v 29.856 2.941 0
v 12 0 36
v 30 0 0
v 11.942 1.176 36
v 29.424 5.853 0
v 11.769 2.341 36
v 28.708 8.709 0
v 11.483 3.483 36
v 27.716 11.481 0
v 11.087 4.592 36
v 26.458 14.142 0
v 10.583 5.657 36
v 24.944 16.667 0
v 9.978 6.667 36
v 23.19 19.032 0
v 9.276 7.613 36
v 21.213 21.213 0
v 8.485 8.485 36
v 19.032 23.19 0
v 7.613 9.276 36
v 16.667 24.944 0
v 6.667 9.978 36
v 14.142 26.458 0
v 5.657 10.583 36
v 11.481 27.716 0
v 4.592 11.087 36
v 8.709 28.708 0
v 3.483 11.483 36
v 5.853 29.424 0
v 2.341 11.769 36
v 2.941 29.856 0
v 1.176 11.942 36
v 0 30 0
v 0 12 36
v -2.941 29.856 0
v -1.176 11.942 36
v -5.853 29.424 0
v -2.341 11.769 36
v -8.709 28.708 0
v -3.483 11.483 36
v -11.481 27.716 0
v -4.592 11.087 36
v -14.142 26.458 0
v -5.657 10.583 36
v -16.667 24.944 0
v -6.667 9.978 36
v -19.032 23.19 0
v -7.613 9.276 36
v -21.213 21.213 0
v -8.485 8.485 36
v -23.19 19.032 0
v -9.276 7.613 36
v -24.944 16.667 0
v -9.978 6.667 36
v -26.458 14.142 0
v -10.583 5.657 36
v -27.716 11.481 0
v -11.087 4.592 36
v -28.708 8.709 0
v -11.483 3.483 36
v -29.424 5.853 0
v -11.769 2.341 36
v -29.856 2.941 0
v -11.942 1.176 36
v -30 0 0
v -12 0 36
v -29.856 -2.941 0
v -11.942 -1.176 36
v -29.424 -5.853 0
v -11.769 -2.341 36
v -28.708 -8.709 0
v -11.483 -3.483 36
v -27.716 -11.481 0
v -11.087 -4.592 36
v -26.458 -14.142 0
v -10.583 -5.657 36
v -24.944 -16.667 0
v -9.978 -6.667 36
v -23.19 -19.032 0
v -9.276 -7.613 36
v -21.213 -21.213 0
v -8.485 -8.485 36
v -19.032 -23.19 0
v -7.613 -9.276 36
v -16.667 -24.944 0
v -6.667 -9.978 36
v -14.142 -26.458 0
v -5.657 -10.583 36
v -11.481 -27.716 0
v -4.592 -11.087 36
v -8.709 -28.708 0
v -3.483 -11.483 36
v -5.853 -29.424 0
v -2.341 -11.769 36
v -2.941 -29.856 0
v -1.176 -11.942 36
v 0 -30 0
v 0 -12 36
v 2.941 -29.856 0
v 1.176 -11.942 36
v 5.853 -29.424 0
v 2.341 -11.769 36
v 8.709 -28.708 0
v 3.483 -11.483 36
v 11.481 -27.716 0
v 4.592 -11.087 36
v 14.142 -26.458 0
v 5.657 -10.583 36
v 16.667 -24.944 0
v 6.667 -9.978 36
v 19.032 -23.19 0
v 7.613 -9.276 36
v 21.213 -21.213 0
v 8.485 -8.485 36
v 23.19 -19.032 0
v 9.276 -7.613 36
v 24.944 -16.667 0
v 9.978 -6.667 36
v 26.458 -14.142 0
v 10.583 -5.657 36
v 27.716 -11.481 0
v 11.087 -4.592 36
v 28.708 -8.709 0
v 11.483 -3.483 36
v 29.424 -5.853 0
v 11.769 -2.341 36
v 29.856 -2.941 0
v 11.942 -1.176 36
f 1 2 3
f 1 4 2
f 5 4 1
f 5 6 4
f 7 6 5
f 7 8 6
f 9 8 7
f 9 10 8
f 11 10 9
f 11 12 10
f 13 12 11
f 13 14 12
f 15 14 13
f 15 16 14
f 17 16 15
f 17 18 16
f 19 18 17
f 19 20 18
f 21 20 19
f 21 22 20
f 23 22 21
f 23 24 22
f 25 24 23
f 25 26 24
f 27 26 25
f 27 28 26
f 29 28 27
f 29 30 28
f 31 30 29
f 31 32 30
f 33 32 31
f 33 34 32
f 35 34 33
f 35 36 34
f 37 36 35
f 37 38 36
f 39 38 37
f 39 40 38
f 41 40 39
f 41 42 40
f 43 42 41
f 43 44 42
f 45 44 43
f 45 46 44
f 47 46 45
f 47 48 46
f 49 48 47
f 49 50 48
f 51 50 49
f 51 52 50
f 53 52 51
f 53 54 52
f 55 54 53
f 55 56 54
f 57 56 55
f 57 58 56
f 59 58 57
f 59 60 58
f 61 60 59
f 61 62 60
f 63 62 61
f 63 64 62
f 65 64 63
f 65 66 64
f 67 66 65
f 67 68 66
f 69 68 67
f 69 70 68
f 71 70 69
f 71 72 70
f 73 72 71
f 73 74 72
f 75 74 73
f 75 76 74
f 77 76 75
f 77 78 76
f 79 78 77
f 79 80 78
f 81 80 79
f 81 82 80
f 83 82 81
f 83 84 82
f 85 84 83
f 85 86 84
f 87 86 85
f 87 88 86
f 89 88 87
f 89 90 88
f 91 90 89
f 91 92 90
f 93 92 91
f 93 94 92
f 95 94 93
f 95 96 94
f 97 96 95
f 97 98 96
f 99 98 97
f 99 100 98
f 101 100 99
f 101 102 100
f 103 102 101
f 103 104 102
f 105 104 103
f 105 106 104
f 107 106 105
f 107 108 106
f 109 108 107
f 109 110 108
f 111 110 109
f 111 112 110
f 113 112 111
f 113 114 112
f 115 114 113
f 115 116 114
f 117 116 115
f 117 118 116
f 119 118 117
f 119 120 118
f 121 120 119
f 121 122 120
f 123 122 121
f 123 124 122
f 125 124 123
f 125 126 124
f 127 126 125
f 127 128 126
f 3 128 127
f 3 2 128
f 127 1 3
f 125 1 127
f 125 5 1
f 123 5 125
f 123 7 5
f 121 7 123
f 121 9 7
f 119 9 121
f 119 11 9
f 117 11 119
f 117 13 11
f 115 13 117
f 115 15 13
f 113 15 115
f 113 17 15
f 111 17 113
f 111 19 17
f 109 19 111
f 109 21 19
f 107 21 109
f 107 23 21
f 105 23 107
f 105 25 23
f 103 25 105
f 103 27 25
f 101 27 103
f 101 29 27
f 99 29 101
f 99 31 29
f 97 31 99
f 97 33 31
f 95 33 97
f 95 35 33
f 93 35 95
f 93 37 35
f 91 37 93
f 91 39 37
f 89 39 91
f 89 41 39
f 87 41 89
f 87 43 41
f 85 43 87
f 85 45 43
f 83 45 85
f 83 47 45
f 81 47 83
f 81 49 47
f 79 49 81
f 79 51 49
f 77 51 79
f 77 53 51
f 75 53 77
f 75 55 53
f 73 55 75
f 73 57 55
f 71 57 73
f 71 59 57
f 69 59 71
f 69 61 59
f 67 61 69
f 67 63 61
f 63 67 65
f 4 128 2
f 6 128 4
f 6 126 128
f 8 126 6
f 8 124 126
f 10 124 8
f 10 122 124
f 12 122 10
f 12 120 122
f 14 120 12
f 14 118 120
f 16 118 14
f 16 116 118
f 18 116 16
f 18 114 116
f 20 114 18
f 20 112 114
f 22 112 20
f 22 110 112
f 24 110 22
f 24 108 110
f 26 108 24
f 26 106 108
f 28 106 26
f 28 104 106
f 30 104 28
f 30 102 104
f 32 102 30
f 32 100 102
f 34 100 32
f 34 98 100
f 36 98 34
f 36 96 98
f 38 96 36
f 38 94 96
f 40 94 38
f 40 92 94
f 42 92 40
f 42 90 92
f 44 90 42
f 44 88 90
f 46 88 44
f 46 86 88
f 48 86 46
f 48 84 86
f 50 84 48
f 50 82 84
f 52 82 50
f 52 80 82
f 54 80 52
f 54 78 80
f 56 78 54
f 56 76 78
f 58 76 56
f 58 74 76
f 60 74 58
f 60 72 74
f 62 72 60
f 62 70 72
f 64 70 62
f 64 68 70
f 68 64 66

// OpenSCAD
// Starter file for task-013.
// Edit this file in OpenSCAD to complete the requested hard task.
$fn = 64;

height = 36;
bottom_d = 60;
top_d = 24;
cylinder(d1=bottom_d, d2=top_d, h=height);
